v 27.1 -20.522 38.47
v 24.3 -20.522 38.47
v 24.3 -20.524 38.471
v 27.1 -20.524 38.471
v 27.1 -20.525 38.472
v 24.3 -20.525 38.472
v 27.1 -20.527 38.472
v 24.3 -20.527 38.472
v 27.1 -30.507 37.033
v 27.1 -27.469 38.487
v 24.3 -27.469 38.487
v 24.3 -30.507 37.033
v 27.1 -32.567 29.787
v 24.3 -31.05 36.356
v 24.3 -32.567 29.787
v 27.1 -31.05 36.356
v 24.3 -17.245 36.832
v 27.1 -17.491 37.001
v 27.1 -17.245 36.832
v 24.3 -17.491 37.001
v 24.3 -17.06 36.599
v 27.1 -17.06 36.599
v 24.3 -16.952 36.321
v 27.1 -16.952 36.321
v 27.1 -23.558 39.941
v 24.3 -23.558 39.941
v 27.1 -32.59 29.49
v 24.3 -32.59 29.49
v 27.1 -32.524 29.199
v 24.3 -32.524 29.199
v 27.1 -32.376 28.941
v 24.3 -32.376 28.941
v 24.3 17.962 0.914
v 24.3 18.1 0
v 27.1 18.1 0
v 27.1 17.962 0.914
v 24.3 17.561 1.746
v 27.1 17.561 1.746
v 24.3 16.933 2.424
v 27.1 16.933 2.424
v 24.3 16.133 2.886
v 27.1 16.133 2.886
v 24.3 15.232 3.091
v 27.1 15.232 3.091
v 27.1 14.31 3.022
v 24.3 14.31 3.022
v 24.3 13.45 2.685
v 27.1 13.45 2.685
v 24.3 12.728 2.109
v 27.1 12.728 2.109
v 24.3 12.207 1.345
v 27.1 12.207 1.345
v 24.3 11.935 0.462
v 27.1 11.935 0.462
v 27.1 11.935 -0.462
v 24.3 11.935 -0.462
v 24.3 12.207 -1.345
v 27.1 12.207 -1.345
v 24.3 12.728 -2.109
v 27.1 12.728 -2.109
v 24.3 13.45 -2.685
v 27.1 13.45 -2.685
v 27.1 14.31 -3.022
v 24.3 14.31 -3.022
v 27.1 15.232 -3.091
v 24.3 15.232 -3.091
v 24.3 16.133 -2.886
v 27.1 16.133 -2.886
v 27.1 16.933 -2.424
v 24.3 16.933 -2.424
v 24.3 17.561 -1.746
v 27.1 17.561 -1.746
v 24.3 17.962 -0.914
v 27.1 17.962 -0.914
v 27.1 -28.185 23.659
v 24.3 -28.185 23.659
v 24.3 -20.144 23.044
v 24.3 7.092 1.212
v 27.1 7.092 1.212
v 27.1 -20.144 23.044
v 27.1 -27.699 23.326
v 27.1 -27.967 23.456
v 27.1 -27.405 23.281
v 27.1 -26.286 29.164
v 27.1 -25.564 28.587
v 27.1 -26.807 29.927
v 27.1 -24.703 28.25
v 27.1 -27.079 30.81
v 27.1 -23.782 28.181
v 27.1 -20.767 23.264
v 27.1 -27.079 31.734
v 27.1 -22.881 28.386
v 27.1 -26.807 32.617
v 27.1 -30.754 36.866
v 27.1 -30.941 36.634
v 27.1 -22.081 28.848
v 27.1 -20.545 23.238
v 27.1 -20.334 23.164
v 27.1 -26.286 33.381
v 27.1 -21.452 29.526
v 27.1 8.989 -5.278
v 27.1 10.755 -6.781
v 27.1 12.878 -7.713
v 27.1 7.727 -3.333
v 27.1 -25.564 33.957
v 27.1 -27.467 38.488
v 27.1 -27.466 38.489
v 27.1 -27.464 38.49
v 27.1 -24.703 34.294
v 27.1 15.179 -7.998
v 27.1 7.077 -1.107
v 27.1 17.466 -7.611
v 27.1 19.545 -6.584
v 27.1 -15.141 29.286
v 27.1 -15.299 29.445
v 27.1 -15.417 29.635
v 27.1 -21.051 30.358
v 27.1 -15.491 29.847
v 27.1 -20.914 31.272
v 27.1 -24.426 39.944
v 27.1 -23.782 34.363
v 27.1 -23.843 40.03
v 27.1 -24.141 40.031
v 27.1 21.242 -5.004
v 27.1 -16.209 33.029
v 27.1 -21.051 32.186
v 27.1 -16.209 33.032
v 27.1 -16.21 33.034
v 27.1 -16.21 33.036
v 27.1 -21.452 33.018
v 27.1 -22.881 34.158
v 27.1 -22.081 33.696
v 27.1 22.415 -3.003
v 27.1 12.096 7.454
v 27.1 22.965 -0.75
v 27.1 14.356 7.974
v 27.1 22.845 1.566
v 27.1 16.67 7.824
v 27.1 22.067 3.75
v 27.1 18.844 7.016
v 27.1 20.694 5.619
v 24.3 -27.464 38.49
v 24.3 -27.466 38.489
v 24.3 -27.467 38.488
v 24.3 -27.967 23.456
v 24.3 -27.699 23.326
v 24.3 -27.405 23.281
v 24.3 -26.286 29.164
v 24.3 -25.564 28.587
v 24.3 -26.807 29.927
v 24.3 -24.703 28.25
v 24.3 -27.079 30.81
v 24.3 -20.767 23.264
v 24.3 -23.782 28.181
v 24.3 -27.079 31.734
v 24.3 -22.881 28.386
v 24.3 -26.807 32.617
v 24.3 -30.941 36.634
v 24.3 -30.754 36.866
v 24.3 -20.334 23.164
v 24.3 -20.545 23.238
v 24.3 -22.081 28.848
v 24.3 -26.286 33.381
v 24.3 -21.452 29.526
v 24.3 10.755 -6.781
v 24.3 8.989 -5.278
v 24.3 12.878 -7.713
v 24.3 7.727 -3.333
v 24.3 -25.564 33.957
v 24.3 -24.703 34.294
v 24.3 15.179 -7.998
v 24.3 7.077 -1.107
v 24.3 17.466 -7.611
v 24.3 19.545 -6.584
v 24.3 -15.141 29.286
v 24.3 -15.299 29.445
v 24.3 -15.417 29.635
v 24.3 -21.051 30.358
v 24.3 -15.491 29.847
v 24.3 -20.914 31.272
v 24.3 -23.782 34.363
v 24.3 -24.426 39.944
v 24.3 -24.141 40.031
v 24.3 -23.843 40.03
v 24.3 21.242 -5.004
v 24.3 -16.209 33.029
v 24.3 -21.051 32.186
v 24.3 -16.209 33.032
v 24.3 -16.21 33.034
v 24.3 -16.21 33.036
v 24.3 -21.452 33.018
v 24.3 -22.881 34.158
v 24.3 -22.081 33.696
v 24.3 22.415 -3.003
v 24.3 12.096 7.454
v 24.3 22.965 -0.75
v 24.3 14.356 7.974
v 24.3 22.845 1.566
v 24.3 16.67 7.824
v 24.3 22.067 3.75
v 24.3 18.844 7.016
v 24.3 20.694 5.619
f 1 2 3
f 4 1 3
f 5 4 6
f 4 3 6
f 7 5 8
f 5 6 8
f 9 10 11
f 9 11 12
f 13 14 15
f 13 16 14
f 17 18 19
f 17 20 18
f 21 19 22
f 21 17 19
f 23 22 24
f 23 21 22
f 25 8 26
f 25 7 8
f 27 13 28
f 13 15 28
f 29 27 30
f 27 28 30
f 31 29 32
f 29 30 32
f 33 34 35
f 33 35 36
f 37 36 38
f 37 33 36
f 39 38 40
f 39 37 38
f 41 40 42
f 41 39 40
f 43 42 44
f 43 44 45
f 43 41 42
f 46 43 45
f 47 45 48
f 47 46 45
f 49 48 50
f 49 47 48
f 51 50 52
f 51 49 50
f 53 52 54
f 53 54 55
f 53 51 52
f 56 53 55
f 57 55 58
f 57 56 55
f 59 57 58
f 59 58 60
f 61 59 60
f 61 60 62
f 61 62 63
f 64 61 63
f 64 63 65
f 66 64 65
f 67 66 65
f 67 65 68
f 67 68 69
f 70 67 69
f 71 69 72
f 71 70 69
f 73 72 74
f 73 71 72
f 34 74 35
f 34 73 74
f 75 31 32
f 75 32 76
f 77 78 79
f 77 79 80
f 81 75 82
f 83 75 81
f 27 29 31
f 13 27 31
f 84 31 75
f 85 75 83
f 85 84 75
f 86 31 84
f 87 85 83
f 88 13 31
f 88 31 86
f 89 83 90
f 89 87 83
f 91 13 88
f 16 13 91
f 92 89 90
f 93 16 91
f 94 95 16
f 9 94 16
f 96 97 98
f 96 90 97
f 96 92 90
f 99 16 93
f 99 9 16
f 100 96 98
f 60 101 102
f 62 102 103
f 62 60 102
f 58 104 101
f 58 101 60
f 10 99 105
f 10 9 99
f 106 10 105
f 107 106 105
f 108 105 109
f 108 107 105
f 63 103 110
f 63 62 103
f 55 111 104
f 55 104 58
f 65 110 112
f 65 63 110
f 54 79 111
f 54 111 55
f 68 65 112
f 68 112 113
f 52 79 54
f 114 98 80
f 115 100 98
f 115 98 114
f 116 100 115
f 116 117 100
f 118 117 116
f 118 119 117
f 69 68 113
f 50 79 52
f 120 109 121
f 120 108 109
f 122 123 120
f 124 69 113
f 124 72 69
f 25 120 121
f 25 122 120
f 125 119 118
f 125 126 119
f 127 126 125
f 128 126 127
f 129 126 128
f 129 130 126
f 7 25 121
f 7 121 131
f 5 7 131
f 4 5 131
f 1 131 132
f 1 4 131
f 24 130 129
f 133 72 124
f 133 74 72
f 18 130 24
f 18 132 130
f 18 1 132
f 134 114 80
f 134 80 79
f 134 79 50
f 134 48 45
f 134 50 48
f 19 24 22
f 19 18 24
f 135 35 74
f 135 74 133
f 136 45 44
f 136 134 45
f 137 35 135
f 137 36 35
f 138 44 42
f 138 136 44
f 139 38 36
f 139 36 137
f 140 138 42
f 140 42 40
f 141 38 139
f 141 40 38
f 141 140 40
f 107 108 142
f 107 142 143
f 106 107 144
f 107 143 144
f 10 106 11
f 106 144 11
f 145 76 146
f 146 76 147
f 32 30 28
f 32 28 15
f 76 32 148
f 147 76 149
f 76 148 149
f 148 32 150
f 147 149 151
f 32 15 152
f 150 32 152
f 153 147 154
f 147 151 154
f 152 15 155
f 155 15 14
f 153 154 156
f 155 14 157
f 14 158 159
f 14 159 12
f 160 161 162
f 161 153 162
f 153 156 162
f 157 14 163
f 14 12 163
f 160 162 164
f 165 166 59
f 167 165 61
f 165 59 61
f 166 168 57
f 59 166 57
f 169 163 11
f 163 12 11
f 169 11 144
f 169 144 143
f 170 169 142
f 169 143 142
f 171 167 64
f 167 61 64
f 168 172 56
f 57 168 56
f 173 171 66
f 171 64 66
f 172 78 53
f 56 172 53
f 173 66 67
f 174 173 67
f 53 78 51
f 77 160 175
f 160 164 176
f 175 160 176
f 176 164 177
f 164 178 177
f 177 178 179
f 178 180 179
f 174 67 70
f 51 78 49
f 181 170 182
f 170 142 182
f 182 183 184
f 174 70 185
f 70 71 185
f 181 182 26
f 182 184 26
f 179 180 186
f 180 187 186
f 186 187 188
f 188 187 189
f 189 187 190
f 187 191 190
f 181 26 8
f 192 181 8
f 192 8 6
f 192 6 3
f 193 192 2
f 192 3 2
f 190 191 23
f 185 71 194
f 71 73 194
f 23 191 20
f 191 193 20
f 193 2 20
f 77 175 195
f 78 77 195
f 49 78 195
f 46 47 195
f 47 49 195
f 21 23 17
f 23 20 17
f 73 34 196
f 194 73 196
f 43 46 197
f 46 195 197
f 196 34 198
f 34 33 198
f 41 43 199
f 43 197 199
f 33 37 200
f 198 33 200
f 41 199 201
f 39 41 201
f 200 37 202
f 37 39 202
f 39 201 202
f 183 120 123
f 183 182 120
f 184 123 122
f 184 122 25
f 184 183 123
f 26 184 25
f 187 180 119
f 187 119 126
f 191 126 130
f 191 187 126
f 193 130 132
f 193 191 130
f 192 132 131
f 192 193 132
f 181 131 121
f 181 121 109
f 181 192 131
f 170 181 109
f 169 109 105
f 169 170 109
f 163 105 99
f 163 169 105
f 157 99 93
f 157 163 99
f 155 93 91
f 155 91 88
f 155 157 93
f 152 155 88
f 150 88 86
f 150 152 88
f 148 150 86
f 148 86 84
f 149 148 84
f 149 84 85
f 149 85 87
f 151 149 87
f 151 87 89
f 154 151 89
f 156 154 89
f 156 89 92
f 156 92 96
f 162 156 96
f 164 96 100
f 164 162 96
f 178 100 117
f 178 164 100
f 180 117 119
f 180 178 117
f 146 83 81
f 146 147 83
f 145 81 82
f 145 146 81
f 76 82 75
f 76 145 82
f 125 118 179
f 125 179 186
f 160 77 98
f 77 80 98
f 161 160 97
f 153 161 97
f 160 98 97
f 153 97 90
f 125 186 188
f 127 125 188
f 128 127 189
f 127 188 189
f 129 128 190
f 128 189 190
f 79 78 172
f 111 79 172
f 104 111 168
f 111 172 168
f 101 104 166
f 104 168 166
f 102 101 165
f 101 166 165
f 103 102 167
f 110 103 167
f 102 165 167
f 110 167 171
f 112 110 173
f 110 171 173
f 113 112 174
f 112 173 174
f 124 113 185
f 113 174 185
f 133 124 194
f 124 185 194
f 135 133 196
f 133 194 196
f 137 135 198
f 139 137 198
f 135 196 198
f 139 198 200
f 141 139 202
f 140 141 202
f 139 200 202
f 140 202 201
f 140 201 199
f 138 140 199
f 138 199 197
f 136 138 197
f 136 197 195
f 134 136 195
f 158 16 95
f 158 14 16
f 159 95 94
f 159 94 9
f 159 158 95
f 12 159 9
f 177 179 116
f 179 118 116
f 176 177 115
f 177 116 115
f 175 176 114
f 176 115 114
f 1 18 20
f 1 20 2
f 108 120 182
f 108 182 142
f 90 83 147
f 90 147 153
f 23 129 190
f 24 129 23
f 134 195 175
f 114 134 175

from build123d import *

# Parameters (mm, degrees)
SKETCH043_R  = 3.1
PAD035_DEPTH = 2.8
SKETCH044_R  = 3.1
PAD036_DEPTH = 2.8
FILLET001_R  = 1


with BuildPart() as part:
    # Sketch043 (on DatumPlane) → Pad035 (new body)
    with BuildSketch(Plane.YZ.offset(24.3)):
        with BuildLine():
            ThreePointArc((7.092358, 1.212106), (21.242166, -5.003536), (12.095894, 7.454272))
            Line((12.095894, 7.454272), (-16.105893, 30.059991))
            ThreePointArc((-16.105893, 30.059991), (-30.255701, 36.275633), (-21.109429, 23.817826))
            Line((7.092358, 1.212106), (-21.109429, 23.817826))
        make_face()
        with Locations((15, 0)):
            Circle(SKETCH043_R, mode=Mode.SUBTRACT)
        with Locations((-24.013535, 31.272097)):
            Circle(SKETCH043_R, mode=Mode.SUBTRACT)
    extrude(amount=PAD035_DEPTH)

    # Sketch044 (on Face8 of Pad035) → Pad036 (join)
    with BuildSketch(Plane.YZ.offset(27.1)):
        Polygon((-30.941816, 36.825603), (-32.675153, 29.317903), (-27.886115, 23.281752), (-20.180945, 23.262493), (-15.361794, 29.27463), (-17.05758, 36.790901), (-23.991342, 40.1514), align=None)
        with Locations((-24.013535, 31.272097)):
            Circle(SKETCH044_R, mode=Mode.SUBTRACT)
    extrude(amount=-PAD036_DEPTH)

    # Fillet001
    fillet001_edges = [part.edges().sort_by_distance(p)[0] for p in [
        (25.7, -15.413825, 29.50525),
        (25.7, -17.05758, 36.790901),
        (25.7, -23.991342, 40.1514),
        (25.7, -30.941816, 36.825603),
        (25.7, -32.675153, 29.317903),
        (25.7, -27.886115, 23.281752),
        (25.7, -20.417361, 23.263084),
    ]]
    fillet(fillet001_edges, radius=FILLET001_R)


solid = part.part
